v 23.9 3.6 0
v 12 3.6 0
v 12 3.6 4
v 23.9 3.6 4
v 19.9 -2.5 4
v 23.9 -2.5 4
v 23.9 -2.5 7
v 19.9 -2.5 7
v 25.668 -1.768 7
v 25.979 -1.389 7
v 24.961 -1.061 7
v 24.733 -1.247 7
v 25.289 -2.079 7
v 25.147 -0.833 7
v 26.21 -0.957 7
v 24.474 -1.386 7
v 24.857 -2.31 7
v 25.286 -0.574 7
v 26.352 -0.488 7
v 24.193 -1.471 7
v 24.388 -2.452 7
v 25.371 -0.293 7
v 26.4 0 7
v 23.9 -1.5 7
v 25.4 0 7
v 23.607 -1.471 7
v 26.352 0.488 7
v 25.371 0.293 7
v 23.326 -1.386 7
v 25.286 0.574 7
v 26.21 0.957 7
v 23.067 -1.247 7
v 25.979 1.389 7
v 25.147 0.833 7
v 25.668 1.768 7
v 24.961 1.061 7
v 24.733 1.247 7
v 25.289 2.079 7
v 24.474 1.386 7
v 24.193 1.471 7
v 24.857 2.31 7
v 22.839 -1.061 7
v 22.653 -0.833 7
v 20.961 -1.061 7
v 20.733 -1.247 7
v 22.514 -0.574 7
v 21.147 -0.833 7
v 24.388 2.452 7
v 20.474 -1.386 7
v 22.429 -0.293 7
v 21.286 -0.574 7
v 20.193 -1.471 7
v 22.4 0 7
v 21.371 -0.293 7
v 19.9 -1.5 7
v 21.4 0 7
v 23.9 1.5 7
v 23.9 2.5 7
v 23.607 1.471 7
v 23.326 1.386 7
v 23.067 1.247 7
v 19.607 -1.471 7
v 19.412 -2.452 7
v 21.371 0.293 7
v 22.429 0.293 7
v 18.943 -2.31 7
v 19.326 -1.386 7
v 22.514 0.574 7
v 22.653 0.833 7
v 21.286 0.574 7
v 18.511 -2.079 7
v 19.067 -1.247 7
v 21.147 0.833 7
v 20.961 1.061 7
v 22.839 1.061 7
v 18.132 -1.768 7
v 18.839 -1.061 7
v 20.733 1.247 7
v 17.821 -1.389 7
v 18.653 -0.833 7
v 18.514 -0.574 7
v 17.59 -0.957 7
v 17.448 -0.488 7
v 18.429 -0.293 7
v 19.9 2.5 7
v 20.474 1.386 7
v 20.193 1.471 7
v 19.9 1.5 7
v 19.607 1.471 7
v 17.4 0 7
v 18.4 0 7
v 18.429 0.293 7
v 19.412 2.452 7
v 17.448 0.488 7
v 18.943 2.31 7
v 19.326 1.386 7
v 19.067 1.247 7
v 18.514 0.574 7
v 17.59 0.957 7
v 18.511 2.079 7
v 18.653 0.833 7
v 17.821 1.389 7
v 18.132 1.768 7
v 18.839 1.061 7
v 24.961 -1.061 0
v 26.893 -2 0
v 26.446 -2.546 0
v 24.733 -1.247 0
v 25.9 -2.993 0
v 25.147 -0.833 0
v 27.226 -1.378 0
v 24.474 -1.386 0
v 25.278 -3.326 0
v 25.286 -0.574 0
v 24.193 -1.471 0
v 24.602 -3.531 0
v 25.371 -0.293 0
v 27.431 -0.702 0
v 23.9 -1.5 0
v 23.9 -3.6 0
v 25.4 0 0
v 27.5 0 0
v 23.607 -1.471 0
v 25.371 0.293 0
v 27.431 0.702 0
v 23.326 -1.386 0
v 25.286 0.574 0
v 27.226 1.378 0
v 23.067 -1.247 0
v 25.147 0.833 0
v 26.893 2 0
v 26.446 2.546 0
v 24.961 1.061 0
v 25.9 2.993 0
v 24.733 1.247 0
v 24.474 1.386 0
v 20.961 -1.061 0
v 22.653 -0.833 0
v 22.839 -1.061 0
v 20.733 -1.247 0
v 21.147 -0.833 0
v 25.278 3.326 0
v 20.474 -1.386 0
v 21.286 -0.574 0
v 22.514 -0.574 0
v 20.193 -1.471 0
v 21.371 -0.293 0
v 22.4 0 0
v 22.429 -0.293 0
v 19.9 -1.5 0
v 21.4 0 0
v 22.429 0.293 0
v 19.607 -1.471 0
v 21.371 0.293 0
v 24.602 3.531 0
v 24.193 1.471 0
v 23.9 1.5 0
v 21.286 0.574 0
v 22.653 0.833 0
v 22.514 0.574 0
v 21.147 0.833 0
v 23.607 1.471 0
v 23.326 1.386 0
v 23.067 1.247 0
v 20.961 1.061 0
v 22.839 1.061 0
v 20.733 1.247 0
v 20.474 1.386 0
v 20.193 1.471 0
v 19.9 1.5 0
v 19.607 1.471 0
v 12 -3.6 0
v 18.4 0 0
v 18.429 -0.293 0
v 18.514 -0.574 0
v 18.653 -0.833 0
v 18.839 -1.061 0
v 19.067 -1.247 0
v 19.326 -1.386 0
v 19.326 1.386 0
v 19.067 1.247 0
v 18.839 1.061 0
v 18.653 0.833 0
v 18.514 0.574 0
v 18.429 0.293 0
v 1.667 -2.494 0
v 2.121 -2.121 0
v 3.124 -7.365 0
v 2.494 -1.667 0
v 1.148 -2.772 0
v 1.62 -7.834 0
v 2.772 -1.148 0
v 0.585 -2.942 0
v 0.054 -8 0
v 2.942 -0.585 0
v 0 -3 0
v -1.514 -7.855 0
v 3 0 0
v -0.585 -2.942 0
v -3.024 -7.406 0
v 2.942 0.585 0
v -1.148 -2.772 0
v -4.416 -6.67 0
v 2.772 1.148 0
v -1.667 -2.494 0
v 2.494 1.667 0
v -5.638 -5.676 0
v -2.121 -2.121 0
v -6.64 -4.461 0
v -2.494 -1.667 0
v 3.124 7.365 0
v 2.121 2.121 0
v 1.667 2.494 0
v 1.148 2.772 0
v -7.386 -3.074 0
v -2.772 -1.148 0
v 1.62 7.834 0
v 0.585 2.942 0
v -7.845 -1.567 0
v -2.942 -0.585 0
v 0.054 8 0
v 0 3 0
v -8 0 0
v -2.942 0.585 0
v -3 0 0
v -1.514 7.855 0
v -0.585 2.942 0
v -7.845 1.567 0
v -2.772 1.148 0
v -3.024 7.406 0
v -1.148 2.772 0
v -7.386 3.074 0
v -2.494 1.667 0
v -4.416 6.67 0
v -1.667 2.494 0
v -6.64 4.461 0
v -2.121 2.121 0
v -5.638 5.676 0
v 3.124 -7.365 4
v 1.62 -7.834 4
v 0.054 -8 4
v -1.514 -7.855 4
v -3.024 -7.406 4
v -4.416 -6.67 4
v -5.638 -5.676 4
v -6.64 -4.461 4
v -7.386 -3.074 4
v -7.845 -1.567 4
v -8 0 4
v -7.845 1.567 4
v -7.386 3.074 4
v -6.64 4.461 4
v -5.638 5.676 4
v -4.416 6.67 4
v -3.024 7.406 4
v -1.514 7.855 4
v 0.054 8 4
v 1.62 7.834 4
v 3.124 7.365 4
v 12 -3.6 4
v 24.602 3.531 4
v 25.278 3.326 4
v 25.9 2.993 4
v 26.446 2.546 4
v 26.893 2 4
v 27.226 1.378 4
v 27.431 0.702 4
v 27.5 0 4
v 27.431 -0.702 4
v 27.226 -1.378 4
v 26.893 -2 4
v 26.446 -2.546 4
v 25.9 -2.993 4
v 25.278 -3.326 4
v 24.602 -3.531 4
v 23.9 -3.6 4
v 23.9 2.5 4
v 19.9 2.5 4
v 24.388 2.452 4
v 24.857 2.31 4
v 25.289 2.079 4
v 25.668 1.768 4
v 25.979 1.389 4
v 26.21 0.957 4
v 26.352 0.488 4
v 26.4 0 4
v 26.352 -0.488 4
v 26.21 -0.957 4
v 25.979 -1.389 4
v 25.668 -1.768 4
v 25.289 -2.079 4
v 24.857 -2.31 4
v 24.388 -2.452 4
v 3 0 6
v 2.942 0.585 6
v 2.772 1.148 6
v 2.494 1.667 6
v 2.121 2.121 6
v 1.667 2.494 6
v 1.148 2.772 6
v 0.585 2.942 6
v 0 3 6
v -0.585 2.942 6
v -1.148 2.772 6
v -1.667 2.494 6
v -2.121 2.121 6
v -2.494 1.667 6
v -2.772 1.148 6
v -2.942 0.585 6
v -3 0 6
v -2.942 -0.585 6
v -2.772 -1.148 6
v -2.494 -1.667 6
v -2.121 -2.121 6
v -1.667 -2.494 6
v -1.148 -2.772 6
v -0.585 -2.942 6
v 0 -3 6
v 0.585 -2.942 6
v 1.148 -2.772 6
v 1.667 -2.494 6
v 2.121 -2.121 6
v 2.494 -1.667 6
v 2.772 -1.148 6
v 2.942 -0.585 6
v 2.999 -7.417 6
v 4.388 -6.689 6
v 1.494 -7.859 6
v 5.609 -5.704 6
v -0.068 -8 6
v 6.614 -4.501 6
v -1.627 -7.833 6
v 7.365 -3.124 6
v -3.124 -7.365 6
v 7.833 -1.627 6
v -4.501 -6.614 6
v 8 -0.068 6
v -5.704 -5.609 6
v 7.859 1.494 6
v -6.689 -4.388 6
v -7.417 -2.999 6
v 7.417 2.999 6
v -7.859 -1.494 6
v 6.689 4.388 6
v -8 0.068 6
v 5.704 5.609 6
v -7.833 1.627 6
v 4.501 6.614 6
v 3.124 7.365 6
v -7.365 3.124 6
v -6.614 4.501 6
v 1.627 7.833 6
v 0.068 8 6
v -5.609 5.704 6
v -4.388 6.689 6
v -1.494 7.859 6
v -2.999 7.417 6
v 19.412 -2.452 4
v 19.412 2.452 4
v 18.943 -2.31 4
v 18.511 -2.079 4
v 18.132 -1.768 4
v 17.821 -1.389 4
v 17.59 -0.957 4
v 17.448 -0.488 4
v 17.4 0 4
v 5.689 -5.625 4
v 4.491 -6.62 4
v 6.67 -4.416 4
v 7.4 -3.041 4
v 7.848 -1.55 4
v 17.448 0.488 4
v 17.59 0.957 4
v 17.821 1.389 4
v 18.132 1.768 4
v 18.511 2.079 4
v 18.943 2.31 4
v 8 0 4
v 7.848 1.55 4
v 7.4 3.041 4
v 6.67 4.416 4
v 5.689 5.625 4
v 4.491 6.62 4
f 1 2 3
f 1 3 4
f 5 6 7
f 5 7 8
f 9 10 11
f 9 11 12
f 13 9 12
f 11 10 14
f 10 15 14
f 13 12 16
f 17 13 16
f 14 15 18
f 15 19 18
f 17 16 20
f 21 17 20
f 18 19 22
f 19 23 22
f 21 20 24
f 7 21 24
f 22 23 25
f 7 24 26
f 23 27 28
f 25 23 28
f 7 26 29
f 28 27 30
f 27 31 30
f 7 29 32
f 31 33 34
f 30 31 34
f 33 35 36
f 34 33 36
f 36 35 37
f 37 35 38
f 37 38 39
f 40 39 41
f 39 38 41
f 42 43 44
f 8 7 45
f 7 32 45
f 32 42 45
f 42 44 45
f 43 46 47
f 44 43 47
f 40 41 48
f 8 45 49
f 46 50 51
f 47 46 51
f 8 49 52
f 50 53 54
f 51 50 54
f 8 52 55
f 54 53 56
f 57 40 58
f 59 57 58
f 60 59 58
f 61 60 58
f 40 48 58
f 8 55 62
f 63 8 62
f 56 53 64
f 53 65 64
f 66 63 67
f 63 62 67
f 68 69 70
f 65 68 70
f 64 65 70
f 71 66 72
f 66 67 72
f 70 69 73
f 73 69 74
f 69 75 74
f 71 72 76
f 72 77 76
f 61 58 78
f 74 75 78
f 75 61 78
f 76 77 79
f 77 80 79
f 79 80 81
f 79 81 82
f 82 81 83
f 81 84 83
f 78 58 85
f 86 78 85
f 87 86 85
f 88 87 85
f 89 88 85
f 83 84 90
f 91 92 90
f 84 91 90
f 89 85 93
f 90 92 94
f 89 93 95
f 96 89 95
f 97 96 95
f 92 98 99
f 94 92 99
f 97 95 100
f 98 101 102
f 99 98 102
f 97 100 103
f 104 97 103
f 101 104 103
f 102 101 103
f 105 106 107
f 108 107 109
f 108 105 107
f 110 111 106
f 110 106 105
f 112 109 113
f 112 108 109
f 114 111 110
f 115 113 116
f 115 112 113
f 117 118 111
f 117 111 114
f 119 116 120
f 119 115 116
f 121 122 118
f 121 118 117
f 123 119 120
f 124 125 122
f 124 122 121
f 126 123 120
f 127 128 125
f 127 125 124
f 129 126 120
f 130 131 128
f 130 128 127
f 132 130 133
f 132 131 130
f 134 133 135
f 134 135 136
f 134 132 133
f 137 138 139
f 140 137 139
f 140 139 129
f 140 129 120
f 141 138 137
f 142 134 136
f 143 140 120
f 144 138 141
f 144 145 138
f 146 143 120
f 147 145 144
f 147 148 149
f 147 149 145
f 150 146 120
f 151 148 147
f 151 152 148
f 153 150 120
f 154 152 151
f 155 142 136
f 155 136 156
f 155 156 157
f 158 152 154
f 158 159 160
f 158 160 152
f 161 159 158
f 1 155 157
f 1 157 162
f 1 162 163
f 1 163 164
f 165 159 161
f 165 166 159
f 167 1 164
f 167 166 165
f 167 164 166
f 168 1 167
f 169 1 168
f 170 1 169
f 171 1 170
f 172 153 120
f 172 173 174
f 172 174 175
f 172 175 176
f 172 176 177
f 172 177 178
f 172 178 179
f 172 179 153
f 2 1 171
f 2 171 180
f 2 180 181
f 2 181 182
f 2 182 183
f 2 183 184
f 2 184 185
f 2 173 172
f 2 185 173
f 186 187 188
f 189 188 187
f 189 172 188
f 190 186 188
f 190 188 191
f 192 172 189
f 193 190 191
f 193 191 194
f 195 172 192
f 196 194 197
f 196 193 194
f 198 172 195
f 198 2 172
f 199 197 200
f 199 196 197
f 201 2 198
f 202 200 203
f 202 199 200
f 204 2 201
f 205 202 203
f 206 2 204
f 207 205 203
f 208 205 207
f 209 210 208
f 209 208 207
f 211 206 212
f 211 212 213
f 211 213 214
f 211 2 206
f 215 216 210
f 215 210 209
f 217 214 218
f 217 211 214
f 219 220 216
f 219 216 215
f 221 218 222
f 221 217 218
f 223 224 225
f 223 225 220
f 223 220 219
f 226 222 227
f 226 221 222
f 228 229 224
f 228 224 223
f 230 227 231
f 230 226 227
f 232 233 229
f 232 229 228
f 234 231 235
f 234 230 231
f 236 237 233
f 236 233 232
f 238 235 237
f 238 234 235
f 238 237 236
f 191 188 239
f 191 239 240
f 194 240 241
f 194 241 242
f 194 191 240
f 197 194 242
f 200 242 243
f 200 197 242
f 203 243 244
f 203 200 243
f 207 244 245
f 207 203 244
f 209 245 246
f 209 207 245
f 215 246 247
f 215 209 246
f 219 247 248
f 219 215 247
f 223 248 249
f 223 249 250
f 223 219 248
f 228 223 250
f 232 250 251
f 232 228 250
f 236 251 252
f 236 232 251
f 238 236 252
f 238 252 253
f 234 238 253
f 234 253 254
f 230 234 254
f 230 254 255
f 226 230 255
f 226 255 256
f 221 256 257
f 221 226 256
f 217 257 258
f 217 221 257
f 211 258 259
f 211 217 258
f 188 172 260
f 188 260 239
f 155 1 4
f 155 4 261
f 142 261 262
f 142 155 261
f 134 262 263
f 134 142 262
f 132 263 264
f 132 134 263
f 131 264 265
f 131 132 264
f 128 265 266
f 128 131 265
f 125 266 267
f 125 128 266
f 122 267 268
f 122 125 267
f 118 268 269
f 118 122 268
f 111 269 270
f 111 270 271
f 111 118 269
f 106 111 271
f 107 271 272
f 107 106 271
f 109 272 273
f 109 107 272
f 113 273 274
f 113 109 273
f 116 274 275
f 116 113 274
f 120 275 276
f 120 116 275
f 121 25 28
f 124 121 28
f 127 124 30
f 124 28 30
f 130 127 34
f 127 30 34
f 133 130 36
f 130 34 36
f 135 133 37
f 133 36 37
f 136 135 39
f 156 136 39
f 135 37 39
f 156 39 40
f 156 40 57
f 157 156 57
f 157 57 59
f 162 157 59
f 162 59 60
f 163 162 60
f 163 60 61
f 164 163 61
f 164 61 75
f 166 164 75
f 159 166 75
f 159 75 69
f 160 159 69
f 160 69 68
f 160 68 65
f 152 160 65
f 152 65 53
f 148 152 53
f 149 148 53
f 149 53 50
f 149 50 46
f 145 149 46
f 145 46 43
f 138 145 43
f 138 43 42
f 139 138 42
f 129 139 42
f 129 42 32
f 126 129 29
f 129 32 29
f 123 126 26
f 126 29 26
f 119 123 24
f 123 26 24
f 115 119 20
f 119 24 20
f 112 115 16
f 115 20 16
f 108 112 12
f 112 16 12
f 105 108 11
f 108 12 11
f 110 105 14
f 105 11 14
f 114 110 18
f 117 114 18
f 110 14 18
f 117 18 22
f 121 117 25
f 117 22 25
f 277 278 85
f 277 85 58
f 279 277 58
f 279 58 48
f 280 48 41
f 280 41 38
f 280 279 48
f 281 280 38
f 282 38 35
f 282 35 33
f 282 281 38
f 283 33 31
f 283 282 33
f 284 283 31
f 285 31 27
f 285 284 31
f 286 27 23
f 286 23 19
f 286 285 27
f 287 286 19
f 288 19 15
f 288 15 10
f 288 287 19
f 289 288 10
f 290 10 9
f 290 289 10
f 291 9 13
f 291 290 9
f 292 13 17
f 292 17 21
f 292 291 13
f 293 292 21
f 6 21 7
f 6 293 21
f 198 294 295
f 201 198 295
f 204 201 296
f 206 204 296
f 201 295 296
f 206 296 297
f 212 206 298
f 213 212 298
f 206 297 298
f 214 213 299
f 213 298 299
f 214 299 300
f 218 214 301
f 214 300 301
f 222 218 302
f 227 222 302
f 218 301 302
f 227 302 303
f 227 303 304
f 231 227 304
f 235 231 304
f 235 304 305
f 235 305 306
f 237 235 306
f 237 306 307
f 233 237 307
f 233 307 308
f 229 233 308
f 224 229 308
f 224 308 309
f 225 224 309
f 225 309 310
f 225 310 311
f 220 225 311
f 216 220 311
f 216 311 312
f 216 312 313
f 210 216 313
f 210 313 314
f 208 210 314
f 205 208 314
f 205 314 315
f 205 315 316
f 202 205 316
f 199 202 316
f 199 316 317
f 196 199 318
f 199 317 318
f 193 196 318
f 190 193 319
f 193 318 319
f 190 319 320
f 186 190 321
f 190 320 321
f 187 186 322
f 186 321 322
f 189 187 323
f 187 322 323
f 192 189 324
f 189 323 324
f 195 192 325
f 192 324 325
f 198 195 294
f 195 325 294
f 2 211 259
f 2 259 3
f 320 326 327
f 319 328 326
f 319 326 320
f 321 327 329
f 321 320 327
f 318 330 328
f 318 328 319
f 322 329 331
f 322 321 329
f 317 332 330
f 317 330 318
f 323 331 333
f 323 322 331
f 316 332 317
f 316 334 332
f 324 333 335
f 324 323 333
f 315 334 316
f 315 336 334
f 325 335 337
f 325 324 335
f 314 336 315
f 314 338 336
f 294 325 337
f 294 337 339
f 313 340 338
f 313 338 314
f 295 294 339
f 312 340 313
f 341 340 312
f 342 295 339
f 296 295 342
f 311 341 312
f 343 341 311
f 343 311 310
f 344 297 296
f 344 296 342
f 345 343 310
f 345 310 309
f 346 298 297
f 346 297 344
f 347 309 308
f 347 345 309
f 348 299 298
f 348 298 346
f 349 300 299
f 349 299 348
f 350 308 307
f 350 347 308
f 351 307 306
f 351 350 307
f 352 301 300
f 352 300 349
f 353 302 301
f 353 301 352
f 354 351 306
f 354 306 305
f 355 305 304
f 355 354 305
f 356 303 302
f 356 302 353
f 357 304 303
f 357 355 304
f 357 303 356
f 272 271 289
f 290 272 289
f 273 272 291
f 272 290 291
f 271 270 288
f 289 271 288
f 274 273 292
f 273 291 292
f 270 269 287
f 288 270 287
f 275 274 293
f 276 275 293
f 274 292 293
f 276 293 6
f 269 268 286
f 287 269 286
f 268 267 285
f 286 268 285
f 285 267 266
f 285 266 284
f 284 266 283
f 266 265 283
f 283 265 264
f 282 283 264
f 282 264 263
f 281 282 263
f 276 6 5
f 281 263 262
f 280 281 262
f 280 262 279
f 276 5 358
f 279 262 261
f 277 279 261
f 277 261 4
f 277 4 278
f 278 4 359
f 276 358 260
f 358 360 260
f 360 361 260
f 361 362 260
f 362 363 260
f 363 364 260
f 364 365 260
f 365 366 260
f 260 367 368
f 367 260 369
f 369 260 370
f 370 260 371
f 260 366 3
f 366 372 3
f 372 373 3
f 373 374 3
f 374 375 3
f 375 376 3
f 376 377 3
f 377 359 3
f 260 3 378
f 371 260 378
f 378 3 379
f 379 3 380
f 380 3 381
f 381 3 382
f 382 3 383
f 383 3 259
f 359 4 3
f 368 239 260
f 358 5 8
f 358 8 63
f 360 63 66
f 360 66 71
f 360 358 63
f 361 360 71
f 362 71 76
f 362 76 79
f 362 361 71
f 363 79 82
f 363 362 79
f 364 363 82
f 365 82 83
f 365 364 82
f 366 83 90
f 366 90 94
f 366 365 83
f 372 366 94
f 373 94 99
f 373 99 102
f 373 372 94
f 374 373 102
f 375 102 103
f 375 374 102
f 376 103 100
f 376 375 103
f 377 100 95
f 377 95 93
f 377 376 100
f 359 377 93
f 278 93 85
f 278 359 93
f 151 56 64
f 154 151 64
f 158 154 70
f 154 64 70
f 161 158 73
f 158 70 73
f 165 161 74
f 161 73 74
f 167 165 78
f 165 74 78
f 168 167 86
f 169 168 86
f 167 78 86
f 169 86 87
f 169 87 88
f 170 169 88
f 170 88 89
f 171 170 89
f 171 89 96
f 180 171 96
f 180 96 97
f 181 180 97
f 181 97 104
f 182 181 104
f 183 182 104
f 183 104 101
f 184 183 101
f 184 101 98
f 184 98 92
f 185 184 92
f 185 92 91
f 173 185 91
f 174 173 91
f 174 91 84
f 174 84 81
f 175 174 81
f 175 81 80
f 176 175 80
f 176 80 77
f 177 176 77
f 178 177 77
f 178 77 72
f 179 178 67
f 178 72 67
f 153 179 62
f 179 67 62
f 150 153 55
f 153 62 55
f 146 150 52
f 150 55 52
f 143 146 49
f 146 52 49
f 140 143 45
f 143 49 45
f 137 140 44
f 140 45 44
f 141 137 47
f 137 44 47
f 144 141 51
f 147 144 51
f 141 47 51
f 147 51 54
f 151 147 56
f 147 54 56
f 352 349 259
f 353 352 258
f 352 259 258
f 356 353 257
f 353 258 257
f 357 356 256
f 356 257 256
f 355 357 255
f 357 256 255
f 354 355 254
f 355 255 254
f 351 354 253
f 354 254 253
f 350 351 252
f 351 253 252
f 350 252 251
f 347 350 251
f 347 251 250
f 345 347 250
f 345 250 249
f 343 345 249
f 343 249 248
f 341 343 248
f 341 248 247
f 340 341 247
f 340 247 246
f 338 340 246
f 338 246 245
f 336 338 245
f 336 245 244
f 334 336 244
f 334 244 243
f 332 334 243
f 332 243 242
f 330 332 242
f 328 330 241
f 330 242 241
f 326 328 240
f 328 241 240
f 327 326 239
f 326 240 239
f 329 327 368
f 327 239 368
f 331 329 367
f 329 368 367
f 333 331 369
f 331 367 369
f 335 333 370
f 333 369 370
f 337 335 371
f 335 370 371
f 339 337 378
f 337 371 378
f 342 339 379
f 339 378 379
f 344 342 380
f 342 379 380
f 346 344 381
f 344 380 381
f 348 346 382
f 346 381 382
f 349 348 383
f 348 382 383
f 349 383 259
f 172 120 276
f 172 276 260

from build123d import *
from build123d.topology import SkipClean

# Parameters (mm, degrees)
BOSS_EXTRUDE1_DEPTH      = 4
SKETCH4_R                = 8
BOSS_EXTRUDE2_DEPTH      = 2
BOSS_EXTRUDE3_DEPTH      = 3
F_3_0_3_DIAMETER_HOLE1_D = 3
F_6_0_6_DIAMETER_HOLE1_D = 6


with BuildPart() as part:
    # Sketch1 → Boss-Extrude1 (new body)
    with BuildSketch(Plane.XY):
        with BuildLine():
            Line((3.123869731, 7.364878676), (12, 3.6))
            Line((12, 3.6), (23.9, 3.6))
            ThreePointArc((23.9, 3.6), (27.5, 0), (23.9, -3.6))
            Line((23.9, -3.6), (12, -3.6))
            Line((12, -3.6), (3.123869731, -7.364878676))
            ThreePointArc((3.123869731, -7.364878676), (-8, 0), (3.123869731, 7.364878676))
        make_face()
    extrude(amount=BOSS_EXTRUDE1_DEPTH)

    # Sketch4 → Boss-Extrude2 (add)
    with SkipClean():  # the faces are left unmerged after this step: merging them gives an invalid solid
        with BuildSketch(Plane.XY.offset(4)):
            with Locations(Location((0, 0, 0), (0, 0, 67.015399011))):
                Circle(SKETCH4_R)
        extrude(amount=BOSS_EXTRUDE2_DEPTH)

    # Sketch5 → Boss-Extrude3 (add)
    with SkipClean():  # the faces are left unmerged after this step: merging them gives an invalid solid
        with BuildSketch(Plane.XY.offset(4)):
            with BuildLine():
                Line((23.9, -2.5), (19.9, -2.5))
                ThreePointArc((19.9, -2.5), (17.4, 0), (19.9, 2.5))
                Line((19.9, 2.5), (23.9, 2.5))
                ThreePointArc((23.9, 2.5), (26.4, 0), (23.9, -2.5))
            make_face()
        extrude(amount=BOSS_EXTRUDE3_DEPTH)

    # Ø3.0 (3) Diameter Hole1 (through all)
    with Locations(Plane(origin=(0, 0, 0), x_dir=(-1, 0, 0), z_dir=(0, 0, -1))):
        with Locations((-23.9, 0), (-19.9, 0)):
            Hole(F_3_0_3_DIAMETER_HOLE1_D / 2)

    # Ø6.0 (6) Diameter Hole1 (through all)
    with Locations(Plane(origin=(0, 0, 0), x_dir=(-1, 0, 0), z_dir=(0, 0, -1))):
        with Locations((0, 0)):
            Hole(F_6_0_6_DIAMETER_HOLE1_D / 2)


solid = part.part
